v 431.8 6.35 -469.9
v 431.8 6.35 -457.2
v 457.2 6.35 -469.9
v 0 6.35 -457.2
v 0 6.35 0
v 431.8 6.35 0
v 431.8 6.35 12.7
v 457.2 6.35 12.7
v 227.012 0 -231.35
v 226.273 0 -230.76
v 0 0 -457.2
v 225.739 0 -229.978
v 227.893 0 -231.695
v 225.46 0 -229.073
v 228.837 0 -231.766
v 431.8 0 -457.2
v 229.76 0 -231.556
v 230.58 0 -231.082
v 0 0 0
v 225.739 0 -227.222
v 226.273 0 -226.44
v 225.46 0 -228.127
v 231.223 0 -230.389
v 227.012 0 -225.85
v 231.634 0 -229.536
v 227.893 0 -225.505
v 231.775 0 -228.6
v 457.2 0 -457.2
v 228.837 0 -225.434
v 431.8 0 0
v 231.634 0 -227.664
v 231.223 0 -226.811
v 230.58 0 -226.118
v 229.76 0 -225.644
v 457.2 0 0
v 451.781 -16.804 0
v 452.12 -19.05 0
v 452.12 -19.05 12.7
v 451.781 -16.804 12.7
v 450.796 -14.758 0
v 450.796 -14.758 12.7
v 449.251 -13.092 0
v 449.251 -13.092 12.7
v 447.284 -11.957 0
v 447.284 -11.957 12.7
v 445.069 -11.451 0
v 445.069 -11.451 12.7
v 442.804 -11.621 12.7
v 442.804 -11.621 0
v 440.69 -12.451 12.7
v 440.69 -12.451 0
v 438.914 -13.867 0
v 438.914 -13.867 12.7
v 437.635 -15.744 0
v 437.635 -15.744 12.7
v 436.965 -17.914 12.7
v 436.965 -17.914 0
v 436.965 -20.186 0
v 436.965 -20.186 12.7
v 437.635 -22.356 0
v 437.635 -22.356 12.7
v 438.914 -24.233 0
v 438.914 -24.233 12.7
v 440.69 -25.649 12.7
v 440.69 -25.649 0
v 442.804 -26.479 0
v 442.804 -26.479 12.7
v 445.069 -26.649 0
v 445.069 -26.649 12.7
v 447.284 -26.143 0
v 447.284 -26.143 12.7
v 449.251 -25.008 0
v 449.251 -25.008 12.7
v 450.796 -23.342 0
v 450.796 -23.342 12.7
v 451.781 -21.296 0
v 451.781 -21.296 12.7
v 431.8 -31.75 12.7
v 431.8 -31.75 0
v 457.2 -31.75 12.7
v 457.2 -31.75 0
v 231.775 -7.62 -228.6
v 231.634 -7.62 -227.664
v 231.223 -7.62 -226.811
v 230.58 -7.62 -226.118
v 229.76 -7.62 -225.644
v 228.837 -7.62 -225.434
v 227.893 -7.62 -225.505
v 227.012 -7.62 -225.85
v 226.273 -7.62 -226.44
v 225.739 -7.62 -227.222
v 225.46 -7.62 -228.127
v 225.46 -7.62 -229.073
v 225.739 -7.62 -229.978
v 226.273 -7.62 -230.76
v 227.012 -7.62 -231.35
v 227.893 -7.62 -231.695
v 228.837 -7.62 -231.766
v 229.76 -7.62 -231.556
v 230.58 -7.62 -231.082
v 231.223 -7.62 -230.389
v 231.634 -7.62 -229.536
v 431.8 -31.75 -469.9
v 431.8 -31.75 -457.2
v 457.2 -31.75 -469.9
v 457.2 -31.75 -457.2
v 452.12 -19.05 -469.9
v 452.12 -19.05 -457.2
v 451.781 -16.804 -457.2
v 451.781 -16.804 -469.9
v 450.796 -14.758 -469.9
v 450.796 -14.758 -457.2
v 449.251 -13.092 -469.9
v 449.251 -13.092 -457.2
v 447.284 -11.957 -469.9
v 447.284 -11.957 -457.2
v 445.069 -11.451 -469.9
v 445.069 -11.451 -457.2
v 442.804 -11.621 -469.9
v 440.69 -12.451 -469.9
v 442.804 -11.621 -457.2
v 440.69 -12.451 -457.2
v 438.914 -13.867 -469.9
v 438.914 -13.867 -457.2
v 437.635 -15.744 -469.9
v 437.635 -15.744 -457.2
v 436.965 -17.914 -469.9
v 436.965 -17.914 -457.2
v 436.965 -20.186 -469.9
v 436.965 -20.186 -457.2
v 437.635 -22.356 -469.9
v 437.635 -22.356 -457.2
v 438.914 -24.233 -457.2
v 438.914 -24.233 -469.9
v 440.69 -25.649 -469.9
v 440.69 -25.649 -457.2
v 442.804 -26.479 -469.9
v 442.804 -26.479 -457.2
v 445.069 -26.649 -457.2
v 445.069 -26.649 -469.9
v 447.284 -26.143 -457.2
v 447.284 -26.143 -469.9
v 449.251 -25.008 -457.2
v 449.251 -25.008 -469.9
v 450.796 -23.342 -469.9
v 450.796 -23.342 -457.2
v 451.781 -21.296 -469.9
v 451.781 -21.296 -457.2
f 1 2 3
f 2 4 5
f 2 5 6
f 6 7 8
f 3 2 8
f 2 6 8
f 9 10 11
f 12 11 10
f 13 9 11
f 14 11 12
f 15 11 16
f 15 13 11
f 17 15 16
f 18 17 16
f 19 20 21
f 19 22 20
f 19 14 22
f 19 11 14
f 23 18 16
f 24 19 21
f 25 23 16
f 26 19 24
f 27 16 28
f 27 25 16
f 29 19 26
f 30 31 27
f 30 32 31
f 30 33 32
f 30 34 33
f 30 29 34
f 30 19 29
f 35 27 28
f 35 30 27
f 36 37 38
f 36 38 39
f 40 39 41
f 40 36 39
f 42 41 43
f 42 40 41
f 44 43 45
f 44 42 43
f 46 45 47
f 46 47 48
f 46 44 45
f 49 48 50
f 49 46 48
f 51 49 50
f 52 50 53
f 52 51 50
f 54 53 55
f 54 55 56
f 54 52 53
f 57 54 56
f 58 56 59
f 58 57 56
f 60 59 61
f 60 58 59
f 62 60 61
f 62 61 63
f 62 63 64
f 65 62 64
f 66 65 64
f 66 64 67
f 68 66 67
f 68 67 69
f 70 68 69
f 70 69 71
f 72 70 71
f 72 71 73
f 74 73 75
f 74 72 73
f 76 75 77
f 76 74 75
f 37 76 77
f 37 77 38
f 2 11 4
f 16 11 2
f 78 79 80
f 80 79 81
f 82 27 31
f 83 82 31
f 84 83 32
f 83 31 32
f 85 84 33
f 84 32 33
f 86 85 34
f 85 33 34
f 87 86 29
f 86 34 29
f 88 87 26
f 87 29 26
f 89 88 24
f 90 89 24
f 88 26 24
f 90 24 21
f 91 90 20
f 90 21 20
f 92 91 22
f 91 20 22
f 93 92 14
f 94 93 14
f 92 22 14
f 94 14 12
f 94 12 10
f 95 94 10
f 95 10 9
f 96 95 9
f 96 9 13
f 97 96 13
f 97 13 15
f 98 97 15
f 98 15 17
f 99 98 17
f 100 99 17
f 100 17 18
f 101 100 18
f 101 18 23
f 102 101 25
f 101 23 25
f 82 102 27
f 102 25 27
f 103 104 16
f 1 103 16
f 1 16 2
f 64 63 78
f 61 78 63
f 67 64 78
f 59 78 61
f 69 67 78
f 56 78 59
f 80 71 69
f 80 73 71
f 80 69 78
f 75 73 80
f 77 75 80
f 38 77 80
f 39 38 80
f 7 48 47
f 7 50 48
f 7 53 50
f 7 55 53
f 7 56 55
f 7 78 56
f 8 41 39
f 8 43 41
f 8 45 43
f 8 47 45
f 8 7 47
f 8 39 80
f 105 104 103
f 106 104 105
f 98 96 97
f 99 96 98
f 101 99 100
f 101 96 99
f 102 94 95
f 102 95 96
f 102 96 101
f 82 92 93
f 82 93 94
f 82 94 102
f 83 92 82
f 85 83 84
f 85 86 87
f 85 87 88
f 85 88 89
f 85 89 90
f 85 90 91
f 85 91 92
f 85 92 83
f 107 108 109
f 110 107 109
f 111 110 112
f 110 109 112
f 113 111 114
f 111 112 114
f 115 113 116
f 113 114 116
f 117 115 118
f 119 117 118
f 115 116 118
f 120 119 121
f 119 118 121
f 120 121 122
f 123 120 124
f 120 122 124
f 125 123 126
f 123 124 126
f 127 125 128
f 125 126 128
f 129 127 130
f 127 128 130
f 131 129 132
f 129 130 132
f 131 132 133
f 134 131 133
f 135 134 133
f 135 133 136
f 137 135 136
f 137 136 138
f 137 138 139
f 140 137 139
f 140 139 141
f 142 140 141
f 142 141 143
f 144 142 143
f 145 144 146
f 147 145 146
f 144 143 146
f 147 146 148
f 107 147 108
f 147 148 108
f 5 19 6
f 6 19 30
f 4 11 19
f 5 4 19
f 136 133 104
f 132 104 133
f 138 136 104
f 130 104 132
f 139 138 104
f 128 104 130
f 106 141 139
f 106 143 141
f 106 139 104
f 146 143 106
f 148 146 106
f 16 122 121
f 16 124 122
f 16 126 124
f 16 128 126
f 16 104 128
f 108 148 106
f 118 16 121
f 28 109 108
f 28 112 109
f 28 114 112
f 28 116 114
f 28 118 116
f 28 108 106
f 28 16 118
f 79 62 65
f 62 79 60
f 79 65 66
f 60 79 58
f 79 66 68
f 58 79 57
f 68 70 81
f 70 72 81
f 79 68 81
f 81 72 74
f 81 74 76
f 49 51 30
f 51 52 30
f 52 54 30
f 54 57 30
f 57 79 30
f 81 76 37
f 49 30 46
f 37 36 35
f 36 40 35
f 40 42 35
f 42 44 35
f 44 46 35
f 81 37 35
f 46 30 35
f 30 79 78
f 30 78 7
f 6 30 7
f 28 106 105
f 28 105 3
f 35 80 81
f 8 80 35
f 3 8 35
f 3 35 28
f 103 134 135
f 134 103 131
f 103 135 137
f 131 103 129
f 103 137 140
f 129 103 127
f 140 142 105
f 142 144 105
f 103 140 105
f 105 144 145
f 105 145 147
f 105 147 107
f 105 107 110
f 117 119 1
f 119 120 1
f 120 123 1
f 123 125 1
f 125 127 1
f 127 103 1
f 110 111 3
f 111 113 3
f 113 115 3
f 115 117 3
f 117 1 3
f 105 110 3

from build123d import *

# Parameters (mm, degrees)
SKETCH1_W           = 457.2
SKETCH1_H           = 228.6
BOSS_EXTRUDE1_DEPTH = 6.35
SKETCH2_W           = 25.4
SKETCH2_H           = 38.1
SKETCH2_R           = 7.62
BOSS_EXTRUDE2_DEPTH = 12.7
SKETCH4_R           = 3.175
BOSS_EXTRUDE4_DEPTH = 7.62


with BuildPart() as part:
    # Sketch1 → Boss-Extrude1 (new body)
    with BuildSketch(Plane(origin=(0, 0, 0), x_dir=(1, 0, 0), z_dir=(0, 1, 0))):
        with Locations((228.6, 114.3)):
            Rectangle(SKETCH1_W, SKETCH1_H)
    boss_extrude1 = extrude(amount=BOSS_EXTRUDE1_DEPTH)

    # Sketch2 → Boss-Extrude2 (add)
    with BuildSketch(Plane.XY):
        with Locations((444.5, -12.7)):
            Rectangle(SKETCH2_W, SKETCH2_H)
        with Locations((444.5, -19.05)):
            Circle(SKETCH2_R, mode=Mode.SUBTRACT)
    boss_extrude2 = extrude(amount=BOSS_EXTRUDE2_DEPTH)

    # Mirror3: Boss-Extrude1, Boss-Extrude2 across plane
    add(boss_extrude1.mirror(Plane(origin=(0, 6.35, -228.6), x_dir=(1, 0, 0), z_dir=(0, 0, 1))))
    add(boss_extrude2.mirror(Plane(origin=(0, 6.35, -228.6), x_dir=(1, 0, 0), z_dir=(0, 0, 1))))

    # Sketch4 → Boss-Extrude4 (add)
    with BuildSketch(Plane.XZ):
        with Locations((228.6, -228.6)):
            Circle(SKETCH4_R)
    extrude(amount=BOSS_EXTRUDE4_DEPTH)


solid = part.part
